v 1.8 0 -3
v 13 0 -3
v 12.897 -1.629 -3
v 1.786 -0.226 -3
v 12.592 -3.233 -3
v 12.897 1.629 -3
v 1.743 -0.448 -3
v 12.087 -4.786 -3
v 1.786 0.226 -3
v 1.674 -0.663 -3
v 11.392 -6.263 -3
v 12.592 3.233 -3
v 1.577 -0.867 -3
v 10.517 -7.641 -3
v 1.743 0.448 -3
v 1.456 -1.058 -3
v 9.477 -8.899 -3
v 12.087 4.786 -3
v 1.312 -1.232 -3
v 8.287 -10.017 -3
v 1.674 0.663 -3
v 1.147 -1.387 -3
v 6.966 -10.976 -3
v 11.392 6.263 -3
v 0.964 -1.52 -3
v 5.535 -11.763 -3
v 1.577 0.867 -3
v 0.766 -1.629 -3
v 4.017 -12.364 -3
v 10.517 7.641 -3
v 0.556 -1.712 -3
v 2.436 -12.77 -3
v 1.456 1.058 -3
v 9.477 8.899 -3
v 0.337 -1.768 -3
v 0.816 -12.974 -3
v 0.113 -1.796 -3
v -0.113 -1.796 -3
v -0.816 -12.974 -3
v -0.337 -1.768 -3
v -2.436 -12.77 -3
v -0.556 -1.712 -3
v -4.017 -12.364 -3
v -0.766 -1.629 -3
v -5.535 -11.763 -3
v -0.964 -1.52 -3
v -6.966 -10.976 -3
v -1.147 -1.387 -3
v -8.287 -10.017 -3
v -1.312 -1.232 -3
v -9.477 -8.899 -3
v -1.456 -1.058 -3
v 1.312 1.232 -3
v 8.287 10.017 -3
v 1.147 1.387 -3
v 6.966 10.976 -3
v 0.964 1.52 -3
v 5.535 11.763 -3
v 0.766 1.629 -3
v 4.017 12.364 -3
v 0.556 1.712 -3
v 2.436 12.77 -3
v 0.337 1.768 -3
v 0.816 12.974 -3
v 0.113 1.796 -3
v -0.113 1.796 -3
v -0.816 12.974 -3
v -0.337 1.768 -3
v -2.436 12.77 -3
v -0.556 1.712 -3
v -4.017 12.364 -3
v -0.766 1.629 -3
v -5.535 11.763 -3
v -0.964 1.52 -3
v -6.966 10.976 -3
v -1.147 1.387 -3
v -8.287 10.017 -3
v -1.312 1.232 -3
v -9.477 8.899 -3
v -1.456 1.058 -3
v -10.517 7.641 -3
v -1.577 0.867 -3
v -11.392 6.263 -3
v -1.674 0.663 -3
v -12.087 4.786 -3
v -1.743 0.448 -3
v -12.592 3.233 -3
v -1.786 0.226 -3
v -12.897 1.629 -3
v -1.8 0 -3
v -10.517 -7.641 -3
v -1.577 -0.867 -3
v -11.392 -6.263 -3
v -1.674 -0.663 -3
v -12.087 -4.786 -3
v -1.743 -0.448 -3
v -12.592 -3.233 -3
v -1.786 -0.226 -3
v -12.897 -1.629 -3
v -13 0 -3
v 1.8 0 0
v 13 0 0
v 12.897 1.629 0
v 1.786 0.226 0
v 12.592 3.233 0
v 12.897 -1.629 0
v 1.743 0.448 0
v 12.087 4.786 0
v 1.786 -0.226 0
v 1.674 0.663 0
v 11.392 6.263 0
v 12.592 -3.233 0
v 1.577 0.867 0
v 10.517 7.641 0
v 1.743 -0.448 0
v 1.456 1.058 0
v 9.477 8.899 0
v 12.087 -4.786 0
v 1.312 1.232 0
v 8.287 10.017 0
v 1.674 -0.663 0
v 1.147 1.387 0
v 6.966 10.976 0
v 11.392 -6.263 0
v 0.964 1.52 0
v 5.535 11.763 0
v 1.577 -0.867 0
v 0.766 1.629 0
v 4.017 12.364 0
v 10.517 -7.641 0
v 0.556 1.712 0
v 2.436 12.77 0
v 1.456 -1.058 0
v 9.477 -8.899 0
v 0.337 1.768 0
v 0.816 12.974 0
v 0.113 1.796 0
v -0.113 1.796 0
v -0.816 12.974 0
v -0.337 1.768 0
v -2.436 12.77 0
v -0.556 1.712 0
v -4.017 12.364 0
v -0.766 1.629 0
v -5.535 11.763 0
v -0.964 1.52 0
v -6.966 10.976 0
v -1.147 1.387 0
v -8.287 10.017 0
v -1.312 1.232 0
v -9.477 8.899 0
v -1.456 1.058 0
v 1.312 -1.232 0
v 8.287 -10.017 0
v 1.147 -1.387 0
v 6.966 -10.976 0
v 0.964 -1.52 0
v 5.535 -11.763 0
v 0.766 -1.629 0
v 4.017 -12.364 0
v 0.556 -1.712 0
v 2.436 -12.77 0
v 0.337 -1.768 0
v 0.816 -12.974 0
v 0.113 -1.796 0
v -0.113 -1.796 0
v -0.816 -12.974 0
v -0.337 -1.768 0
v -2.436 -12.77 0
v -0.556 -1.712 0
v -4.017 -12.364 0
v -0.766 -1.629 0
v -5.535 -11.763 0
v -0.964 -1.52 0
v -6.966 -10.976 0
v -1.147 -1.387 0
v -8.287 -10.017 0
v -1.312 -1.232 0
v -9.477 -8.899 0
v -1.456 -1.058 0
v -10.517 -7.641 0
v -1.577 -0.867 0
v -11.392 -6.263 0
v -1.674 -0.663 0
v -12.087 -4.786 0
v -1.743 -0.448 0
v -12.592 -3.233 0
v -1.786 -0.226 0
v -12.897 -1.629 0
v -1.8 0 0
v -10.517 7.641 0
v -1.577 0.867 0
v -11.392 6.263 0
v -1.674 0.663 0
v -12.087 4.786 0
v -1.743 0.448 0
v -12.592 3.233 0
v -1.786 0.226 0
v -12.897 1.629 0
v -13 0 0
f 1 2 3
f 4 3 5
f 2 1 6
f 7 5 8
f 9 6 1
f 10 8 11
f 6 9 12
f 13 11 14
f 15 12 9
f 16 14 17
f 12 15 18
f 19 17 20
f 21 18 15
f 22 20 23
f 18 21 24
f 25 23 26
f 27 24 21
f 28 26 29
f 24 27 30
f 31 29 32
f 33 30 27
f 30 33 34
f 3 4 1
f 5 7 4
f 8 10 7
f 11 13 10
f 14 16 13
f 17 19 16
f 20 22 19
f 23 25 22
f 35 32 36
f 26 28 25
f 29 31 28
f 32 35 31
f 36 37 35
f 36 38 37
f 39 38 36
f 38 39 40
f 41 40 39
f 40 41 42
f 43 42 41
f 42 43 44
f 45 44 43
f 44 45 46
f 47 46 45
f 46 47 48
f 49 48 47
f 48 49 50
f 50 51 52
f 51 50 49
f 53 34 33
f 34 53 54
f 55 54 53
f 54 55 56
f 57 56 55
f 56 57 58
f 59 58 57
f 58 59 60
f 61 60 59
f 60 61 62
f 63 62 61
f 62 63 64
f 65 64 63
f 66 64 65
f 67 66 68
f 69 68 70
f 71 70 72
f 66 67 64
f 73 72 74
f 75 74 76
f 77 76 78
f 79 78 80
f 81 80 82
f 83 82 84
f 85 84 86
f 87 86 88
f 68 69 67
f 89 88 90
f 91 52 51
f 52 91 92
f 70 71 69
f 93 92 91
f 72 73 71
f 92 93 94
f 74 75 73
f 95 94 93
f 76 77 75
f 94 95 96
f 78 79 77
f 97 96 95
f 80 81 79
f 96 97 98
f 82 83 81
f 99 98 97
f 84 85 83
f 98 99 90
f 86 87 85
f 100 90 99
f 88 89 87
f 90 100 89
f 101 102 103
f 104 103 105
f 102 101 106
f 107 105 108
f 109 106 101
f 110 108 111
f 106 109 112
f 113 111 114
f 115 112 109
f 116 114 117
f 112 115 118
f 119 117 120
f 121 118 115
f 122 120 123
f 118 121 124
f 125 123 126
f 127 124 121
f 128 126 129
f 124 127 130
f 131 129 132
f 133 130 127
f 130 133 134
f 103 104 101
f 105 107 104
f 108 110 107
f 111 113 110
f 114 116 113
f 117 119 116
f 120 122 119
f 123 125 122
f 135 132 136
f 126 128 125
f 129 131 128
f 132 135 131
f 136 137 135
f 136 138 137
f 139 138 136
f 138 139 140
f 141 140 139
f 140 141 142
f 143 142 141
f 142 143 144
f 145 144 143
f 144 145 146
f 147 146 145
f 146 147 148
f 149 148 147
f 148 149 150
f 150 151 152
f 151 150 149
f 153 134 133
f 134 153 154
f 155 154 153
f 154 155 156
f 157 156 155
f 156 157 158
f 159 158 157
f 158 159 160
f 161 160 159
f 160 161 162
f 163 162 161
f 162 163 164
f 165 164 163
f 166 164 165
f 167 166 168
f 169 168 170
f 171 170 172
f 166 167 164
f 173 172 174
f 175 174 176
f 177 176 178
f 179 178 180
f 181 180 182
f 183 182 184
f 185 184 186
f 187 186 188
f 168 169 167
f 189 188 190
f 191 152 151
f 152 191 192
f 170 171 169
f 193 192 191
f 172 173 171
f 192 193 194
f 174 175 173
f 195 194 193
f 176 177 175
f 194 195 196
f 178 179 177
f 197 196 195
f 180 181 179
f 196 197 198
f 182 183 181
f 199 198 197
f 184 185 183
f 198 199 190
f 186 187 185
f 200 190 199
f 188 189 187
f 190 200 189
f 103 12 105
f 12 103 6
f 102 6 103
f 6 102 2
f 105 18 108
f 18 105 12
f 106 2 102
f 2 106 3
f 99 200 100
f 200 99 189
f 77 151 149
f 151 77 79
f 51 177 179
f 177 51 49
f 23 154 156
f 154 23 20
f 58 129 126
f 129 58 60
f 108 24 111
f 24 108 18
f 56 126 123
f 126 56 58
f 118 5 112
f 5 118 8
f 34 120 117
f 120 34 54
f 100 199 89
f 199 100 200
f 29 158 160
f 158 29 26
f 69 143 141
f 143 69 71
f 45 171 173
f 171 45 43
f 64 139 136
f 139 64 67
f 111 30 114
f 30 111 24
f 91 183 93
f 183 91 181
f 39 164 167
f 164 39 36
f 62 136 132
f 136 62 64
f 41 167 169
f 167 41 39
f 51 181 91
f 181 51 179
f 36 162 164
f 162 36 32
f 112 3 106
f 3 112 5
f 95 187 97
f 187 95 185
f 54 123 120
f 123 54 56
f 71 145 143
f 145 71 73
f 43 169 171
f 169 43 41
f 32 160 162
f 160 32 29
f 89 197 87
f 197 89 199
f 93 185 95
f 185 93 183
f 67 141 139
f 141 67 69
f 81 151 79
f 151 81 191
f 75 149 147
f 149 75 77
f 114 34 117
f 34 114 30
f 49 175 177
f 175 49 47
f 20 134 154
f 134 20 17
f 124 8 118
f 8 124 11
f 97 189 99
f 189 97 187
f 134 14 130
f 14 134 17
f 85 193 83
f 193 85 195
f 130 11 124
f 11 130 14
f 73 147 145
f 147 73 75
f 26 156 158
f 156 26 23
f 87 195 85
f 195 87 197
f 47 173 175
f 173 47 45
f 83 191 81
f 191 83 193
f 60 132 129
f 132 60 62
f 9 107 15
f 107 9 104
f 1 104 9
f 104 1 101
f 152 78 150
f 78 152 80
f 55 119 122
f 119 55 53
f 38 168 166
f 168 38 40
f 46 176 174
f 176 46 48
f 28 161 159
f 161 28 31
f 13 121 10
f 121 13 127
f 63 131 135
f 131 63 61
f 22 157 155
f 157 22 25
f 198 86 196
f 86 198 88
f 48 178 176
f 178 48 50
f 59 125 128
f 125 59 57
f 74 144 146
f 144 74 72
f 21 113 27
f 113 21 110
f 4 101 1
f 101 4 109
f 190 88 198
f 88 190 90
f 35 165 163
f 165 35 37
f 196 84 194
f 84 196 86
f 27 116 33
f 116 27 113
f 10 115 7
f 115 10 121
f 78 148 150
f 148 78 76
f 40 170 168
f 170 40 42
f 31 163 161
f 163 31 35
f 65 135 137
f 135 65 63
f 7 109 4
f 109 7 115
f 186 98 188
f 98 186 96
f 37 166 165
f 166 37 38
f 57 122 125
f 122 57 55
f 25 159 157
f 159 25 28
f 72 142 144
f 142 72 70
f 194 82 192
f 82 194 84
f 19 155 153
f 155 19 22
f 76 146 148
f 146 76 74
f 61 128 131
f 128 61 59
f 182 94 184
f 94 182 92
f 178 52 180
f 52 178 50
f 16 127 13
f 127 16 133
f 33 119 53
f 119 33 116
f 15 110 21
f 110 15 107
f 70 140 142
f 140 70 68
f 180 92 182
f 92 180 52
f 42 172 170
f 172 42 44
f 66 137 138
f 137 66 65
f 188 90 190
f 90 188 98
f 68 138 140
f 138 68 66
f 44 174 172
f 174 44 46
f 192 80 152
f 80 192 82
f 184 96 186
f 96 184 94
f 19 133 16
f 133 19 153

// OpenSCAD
$fn = 50;


difference() {
	union() {
		translate(v = [0, 0, -3.0000000000]) {
			cylinder(h = 3, r = 7.0000000000);
		}
		translate(v = [0, 0, -3.0000000000]) {
			cylinder(h = 3, r = 13.0000000000);
		}
	}
	union() {
		#translate(v = [0, 0, -3]) {
			cylinder(h = 3, r = 1.8000000000);
		}
	}
}
